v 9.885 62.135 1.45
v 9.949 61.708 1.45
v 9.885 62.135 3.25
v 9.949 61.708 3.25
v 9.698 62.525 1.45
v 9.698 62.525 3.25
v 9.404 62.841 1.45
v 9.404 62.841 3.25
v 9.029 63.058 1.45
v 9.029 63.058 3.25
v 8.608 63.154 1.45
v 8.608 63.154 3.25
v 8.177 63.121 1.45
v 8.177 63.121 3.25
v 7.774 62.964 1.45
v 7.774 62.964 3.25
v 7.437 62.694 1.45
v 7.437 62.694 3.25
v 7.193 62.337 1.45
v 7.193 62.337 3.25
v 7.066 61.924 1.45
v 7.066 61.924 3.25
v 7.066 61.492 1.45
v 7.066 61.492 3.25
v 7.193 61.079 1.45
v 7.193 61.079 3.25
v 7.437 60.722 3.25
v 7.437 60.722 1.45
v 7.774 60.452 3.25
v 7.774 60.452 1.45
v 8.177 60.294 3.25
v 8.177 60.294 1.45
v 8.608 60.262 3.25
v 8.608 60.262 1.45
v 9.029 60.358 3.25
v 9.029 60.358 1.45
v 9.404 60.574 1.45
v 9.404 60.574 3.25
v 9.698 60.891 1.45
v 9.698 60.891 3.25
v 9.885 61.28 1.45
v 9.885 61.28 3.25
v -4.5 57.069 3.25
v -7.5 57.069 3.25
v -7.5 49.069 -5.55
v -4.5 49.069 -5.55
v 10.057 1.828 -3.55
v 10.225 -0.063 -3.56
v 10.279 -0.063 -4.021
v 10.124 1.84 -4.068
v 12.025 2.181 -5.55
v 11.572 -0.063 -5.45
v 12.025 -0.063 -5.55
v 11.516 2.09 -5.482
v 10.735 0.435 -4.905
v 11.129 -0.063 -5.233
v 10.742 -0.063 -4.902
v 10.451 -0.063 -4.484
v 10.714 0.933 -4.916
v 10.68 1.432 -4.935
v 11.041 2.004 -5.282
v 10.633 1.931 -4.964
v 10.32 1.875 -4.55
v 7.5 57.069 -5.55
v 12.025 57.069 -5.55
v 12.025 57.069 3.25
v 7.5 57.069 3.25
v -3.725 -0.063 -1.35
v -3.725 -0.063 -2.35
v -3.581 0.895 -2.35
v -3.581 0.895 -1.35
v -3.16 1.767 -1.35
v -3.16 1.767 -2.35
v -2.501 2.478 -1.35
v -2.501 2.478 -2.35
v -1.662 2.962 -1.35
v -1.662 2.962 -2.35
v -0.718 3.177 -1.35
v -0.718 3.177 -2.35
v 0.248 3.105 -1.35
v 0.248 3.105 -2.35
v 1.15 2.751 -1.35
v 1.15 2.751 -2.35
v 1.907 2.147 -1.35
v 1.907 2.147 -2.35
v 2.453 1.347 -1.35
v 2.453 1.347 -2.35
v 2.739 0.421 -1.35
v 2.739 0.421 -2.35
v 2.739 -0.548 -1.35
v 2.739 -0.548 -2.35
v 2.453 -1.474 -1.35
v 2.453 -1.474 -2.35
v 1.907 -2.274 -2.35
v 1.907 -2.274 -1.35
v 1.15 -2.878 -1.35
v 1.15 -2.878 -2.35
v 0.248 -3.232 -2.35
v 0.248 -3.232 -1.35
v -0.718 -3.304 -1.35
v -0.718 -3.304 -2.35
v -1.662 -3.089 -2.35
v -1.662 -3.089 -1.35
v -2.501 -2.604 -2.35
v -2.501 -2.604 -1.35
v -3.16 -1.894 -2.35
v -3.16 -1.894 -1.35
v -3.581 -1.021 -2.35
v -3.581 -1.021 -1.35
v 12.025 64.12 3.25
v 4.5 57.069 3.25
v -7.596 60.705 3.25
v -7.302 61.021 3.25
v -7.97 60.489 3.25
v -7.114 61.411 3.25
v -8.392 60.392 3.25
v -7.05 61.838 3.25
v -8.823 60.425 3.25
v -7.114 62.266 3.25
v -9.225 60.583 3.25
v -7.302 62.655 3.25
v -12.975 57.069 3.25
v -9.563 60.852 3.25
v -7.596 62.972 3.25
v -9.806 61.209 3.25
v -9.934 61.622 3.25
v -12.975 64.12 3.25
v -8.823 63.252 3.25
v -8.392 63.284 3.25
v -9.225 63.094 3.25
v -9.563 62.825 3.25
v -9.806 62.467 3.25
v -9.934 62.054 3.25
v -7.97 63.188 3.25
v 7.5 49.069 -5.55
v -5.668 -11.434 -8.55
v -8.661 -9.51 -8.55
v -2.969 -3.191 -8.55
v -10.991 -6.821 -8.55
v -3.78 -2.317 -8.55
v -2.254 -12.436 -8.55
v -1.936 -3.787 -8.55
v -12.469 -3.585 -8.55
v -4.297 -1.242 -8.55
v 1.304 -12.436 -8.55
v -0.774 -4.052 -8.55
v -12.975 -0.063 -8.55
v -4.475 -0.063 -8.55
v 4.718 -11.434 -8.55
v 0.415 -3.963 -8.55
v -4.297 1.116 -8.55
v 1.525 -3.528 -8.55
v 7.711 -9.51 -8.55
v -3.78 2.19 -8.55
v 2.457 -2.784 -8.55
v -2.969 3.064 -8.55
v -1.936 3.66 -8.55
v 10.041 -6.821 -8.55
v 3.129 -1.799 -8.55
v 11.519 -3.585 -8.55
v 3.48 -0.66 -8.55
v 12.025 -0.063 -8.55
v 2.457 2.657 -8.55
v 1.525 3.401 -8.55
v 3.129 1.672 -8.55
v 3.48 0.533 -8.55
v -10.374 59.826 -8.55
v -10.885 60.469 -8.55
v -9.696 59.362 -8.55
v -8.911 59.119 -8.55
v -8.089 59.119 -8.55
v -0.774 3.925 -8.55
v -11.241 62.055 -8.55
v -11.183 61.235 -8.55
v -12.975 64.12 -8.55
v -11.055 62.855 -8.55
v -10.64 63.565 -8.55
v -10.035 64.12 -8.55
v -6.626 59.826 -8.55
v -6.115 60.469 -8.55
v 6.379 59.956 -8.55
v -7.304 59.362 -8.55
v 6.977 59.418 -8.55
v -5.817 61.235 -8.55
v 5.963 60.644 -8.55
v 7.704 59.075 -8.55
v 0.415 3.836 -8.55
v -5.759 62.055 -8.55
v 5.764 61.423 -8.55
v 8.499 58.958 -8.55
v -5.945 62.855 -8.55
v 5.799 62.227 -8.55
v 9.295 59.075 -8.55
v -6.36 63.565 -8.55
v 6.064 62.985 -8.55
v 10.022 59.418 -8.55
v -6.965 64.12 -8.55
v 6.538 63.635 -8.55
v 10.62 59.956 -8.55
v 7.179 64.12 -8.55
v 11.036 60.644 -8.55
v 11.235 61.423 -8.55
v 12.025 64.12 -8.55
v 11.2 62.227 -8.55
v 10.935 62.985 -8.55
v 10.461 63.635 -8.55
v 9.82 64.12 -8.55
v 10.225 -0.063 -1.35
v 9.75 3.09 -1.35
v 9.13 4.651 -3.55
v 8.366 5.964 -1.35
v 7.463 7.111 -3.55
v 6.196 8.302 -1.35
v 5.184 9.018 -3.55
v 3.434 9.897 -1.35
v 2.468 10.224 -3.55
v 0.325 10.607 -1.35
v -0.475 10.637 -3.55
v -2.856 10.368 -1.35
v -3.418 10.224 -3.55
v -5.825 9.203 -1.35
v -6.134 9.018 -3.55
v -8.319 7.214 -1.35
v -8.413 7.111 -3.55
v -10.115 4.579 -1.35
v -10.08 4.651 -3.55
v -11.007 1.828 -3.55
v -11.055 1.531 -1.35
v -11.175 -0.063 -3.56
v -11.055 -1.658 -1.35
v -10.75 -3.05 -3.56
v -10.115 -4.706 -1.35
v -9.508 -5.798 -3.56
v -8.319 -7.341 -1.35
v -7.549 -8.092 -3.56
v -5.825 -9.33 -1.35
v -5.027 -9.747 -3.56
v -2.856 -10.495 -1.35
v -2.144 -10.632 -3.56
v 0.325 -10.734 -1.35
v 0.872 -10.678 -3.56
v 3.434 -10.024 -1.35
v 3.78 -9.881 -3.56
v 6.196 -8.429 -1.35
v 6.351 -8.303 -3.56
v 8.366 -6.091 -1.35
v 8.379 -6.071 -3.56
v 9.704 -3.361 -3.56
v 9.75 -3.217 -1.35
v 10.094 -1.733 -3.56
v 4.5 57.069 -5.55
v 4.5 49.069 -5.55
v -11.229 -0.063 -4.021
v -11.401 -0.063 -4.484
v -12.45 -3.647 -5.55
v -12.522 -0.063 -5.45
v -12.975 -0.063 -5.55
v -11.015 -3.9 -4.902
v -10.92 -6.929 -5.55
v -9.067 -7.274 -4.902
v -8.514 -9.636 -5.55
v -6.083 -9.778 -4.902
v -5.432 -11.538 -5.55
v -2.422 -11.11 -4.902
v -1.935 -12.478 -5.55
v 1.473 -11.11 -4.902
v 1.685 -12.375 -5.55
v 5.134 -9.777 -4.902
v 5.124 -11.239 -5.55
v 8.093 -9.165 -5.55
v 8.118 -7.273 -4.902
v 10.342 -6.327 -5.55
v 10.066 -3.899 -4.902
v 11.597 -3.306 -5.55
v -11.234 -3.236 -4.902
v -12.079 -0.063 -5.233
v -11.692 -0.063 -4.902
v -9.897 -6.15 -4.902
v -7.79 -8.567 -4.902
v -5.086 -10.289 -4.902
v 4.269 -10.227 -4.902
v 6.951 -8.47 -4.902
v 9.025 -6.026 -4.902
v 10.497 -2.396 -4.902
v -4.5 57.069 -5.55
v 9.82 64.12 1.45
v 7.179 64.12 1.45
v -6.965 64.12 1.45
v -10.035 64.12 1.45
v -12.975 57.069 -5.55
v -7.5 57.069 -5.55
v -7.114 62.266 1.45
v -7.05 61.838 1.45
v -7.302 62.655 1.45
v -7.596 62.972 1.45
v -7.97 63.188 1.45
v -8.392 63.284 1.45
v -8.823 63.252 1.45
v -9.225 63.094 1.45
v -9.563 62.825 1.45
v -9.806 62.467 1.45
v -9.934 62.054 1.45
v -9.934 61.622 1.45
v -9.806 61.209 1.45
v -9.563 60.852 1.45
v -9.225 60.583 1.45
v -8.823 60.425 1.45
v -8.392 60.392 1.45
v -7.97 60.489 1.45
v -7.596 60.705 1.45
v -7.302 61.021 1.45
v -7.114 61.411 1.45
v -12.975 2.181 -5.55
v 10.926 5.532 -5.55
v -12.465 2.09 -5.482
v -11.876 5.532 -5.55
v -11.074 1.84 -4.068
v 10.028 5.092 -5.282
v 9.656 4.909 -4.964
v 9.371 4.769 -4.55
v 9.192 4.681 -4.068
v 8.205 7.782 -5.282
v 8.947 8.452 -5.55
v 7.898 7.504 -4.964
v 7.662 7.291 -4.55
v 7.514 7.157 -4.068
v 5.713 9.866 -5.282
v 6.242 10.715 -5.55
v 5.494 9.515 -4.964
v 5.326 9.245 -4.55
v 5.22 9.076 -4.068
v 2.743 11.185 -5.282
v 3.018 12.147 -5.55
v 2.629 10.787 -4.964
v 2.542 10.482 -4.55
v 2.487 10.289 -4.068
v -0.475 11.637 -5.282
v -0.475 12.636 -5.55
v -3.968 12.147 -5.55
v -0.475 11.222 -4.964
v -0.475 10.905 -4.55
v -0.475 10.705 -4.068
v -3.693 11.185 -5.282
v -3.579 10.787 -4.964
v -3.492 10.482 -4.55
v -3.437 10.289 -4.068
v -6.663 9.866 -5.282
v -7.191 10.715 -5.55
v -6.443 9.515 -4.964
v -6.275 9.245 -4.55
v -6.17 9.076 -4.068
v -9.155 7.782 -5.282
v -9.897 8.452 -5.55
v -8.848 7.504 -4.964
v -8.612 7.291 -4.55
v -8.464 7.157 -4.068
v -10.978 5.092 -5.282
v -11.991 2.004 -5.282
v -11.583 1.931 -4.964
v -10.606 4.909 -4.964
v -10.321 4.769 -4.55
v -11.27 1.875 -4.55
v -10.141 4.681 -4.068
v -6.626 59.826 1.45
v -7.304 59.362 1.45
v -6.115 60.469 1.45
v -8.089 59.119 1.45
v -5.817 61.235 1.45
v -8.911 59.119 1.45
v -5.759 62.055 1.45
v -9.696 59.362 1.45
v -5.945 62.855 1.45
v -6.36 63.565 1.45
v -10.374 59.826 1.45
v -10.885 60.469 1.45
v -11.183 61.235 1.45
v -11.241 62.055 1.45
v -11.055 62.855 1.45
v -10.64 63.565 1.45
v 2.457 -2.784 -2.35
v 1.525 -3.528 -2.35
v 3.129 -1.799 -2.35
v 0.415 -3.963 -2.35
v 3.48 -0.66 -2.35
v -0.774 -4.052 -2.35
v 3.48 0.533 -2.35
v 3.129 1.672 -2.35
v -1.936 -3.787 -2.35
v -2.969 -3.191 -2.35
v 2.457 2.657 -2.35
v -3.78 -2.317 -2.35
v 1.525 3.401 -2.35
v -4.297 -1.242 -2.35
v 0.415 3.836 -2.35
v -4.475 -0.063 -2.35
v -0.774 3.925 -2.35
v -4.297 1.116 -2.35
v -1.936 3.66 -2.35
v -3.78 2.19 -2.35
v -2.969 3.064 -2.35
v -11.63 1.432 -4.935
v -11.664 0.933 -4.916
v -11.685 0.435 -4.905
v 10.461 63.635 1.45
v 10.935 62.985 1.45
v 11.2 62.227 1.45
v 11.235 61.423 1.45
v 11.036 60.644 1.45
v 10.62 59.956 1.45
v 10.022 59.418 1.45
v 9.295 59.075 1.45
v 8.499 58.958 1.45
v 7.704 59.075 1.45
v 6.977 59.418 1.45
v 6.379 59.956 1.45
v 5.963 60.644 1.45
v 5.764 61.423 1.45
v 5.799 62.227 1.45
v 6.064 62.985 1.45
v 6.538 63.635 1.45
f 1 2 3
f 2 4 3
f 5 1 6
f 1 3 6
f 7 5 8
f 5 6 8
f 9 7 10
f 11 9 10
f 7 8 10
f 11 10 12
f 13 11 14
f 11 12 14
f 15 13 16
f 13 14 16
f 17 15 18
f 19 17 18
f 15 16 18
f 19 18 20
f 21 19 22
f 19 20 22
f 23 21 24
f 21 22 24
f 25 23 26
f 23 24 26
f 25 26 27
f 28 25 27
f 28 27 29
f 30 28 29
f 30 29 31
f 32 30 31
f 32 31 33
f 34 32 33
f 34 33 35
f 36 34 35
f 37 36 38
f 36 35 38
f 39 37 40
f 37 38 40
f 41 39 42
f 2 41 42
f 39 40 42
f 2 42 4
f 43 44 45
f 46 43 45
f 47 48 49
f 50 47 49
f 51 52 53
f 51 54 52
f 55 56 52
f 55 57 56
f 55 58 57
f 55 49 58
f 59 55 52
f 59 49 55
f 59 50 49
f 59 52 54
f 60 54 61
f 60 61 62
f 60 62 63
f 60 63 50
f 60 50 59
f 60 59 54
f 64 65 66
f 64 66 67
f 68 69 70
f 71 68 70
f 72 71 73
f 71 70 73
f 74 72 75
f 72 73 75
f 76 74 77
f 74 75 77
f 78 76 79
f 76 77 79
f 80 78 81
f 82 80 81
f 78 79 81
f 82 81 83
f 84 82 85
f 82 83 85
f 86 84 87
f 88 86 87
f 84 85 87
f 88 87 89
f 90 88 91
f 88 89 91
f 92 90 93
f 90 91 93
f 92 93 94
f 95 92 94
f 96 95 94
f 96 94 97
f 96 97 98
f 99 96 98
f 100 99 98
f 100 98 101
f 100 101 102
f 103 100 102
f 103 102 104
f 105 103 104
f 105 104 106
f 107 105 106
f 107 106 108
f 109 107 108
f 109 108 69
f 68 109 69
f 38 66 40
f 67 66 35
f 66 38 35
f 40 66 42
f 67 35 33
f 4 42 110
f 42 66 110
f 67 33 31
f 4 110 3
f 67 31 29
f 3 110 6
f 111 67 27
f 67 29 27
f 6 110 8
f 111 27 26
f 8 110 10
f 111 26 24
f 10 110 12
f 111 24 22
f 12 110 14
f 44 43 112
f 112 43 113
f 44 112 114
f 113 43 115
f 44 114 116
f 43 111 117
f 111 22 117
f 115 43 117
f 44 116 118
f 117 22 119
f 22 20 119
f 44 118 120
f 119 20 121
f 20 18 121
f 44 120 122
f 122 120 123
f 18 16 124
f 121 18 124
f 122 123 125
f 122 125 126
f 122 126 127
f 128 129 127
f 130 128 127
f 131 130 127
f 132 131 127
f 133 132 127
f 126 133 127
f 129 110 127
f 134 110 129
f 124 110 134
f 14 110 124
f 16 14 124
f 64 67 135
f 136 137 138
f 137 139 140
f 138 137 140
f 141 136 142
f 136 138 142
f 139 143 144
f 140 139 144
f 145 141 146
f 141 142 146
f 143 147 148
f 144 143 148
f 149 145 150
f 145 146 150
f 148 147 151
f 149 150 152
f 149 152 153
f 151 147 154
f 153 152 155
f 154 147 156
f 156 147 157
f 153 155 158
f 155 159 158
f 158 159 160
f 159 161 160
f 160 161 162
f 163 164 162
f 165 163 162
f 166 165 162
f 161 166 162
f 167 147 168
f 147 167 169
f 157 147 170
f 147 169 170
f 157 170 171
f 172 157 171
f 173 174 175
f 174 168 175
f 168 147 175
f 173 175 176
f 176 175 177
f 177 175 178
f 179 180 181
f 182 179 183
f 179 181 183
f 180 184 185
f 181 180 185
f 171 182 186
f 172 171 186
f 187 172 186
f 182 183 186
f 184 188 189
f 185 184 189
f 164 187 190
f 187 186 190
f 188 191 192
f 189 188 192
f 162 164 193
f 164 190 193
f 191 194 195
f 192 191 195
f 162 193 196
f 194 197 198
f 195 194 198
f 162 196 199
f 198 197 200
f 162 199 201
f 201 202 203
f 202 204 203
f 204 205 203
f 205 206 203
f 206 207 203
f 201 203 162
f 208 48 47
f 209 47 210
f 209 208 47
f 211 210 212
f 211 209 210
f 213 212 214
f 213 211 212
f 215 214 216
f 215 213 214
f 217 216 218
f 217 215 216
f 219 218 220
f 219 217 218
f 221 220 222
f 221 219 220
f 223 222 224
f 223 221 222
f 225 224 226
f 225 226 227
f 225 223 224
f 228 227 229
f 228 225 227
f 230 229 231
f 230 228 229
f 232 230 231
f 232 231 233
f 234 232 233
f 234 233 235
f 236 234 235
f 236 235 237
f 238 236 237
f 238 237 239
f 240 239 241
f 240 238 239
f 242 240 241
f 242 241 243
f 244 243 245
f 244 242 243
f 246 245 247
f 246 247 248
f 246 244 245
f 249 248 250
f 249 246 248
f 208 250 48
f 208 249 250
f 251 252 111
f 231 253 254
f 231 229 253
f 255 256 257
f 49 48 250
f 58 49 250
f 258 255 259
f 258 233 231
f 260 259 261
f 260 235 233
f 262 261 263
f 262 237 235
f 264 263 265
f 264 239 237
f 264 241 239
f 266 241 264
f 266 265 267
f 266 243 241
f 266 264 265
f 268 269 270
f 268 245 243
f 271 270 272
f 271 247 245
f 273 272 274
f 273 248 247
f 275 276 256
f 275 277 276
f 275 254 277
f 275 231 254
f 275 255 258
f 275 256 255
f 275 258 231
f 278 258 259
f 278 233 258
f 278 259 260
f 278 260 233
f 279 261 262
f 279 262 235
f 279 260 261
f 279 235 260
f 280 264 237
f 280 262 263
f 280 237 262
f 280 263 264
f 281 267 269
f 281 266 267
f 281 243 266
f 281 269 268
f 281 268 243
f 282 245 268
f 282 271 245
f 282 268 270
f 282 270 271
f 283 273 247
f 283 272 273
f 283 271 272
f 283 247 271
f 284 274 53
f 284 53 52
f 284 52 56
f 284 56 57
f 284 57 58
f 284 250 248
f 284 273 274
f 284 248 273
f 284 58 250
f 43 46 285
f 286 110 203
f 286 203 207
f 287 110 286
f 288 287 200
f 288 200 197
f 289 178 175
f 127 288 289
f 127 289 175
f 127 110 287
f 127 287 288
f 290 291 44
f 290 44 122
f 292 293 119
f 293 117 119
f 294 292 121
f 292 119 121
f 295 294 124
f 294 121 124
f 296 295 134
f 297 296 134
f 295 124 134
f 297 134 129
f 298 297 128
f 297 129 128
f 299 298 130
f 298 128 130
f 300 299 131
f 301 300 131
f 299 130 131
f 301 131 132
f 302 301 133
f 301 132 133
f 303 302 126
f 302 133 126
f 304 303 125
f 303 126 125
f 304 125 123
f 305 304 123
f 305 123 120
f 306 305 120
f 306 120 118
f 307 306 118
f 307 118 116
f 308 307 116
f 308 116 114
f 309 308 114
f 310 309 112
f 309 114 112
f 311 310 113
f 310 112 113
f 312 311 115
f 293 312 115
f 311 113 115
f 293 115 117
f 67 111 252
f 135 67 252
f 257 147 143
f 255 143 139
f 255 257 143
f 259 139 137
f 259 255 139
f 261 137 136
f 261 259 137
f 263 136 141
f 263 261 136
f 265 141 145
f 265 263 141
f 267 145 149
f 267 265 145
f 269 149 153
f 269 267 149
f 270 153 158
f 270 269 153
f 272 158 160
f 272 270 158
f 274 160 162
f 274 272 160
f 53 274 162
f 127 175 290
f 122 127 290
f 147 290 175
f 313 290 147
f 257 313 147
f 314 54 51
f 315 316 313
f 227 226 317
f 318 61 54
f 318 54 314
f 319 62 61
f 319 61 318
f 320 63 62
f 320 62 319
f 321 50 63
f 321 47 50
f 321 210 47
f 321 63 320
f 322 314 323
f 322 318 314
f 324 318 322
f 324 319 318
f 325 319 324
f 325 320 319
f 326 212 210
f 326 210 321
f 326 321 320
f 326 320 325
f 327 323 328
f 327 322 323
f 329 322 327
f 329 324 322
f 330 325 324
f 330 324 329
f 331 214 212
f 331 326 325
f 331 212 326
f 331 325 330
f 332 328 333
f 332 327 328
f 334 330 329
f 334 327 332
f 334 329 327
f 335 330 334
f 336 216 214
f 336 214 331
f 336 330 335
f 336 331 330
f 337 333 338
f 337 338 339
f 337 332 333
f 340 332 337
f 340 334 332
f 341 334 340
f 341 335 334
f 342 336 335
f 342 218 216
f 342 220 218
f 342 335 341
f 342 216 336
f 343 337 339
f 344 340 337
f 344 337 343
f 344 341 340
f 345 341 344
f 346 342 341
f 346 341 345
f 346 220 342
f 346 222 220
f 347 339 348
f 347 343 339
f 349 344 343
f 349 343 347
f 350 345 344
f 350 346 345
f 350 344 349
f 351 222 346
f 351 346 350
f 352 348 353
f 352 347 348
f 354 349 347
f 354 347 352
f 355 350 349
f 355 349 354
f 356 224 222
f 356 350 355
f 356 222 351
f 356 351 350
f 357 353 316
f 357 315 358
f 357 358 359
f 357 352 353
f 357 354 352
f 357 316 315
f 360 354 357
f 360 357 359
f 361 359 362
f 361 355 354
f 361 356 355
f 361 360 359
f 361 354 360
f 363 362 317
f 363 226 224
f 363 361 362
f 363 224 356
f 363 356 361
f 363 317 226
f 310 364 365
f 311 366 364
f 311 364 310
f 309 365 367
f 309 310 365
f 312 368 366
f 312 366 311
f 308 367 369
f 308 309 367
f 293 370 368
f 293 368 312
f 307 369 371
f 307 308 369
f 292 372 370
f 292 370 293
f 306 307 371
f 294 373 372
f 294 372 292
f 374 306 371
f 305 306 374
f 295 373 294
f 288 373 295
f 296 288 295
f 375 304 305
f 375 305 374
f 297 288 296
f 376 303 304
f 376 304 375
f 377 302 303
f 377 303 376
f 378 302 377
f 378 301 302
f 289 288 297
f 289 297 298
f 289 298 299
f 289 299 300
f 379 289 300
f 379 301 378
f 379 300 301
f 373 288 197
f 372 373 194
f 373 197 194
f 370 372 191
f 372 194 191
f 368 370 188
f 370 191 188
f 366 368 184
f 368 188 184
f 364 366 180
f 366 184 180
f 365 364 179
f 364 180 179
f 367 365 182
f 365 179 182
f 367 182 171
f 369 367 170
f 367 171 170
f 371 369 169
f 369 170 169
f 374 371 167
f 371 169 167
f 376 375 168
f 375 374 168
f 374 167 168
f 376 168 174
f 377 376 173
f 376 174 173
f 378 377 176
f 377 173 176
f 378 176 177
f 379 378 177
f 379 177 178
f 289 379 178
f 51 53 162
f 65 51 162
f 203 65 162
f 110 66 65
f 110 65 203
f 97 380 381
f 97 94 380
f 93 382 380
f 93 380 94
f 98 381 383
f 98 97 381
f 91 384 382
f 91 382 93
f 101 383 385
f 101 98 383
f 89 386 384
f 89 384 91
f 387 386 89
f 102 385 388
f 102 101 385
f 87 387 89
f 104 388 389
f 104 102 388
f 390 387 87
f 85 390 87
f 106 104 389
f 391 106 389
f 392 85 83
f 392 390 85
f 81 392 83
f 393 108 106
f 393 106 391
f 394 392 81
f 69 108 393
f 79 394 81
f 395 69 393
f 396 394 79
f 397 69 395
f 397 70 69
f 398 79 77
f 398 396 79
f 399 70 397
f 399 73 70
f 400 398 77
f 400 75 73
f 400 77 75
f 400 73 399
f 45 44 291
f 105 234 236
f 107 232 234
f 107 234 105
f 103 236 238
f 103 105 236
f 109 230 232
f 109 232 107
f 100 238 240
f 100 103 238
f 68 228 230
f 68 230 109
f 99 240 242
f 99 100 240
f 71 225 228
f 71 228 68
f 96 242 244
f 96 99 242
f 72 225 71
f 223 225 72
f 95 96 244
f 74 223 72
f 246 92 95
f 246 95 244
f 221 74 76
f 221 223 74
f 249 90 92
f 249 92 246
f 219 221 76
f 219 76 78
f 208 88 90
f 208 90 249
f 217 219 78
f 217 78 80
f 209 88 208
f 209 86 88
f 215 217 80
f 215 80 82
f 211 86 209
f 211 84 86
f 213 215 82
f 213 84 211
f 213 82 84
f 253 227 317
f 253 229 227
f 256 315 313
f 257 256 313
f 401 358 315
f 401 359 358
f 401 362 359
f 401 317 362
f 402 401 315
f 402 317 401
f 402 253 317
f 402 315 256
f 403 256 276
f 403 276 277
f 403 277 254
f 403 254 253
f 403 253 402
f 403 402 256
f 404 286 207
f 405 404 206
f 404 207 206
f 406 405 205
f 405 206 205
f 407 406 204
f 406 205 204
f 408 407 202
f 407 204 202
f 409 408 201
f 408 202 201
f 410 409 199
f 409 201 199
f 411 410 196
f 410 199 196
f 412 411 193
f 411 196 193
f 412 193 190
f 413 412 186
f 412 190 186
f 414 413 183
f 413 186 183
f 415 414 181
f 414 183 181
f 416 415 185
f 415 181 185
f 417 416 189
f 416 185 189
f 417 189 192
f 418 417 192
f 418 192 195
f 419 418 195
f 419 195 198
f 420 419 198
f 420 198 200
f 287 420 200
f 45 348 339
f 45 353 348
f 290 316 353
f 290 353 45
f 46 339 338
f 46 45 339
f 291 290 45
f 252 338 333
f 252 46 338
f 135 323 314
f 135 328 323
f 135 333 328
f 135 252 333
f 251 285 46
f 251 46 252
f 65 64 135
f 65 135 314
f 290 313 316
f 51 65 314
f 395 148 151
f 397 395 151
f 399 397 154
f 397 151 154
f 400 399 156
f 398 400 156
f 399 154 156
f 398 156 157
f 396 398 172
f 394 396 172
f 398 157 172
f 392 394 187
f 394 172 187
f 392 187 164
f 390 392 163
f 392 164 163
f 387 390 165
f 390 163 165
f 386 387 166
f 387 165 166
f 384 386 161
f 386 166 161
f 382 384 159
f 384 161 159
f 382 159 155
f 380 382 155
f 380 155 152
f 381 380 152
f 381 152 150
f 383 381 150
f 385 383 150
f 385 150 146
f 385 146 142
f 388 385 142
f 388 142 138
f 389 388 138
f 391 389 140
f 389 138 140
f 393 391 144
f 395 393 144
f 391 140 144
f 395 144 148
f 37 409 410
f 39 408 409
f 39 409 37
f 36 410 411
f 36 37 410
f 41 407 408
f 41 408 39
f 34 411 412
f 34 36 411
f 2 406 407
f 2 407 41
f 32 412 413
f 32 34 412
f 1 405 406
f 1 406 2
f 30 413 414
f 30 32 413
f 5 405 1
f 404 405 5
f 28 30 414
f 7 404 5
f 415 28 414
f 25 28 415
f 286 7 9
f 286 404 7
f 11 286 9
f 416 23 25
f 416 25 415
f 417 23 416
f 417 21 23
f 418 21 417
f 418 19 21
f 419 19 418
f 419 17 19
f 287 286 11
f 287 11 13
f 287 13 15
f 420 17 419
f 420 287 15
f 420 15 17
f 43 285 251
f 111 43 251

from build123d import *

# Parameters (mm, degrees)
ESBO_O2_R                           = 10.7
RESSALTO_EXTRUS_O1_DEPTH            = 4.2
RESSALTO_EXTRUS_O3_DEPTH            = 3
ESBO_O5_W                           = 25
ESBO_O5_H                           = 7.051040728
RESSALTO_EXTRUS_O4_DEPTH            = 11.8
REBAIXO_PARA_SHCS_M2_51_D           = 2.9
REBAIXO_PARA_SHCS_M2_51_CBORE_D     = 5.5
REBAIXO_PARA_SHCS_M2_51_CBORE_DEPTH = 10
NERVURA1_REACH                      = 67.976
ESBO_O10_WALL_W                     = 145.845066172
ESBO_O10_WALL_H                     = 15
CORTE_EXTRUS_O1_REACH               = 68.009
ESBO_O11_W                          = 9
ESBO_O11_H                          = 8
ESBO_O12_R                          = 3.25
CORTE_EXTRUS_O2_DEPTH               = 67.475439137
ESBO_O13_R                          = 4
CORTE_EXTRUS_O3_DEPTH               = 6.2
FILETE1_R                           = 2


with BuildPart() as part:
    # Esboço2 → Ressalto-extrusão1 (new body)
    with BuildSketch(Plane.XY.offset(-1.35)):
        with Locations((-0.474928023, -0.063425095)):
            Circle(ESBO_O2_R)
    extrude(amount=-RESSALTO_EXTRUS_O1_DEPTH)

    # Esboço4 → Ressalto-extrusão3 (add)
    with BuildSketch(Plane(origin=(0, 0, -5.55), x_dir=(-1, 0, 0), z_dir=(0, 0, -1))):
        with BuildLine():
            Line((-12.025071977, -0.063425095), (-12.025071977, 64.120162595))
            Line((-12.025071977, 64.120162595), (12.974928023, 64.120162595))
            Line((12.974928023, 64.120162595), (12.974928023, -0.063425095))
            ThreePointArc((12.974928023, -0.063425095), (0.474928023, -12.563425095), (-12.025071977, -0.063425095))
        make_face()
    extrude(amount=RESSALTO_EXTRUS_O3_DEPTH)

    # Esboço5 → Ressalto-extrusão4 (add)
    with BuildSketch(Plane(origin=(0, 0, -8.55), x_dir=(-1, 0, 0), z_dir=(0, 0, -1))):
        with Locations((0.474928023, 60.594642231)):
            Rectangle(ESBO_O5_W, ESBO_O5_H)
    extrude(amount=-RESSALTO_EXTRUS_O4_DEPTH)

    # Rebaixo para SHCS M2.51 (through all)
    with Locations(Plane(origin=(0, 0, -8.55), x_dir=(-1, 0, 0), z_dir=(0, 0, -1))):
        with Locations((-8.49949915, 61.707782077), (8.5, 61.838275999)):
            CounterBoreHole(REBAIXO_PARA_SHCS_M2_51_D / 2, REBAIXO_PARA_SHCS_M2_51_CBORE_D / 2, REBAIXO_PARA_SHCS_M2_51_CBORE_DEPTH)

    # Esboço10 wall → Nervura1 (add, up to next)
    with BuildSketch(Plane(origin=(0, 53.069121867, -1.15), x_dir=(0, -0.672672793996, -0.739940073396), z_dir=(0, 0.739940073396, -0.672672793996)), mode=Mode.PRIVATE) as nervura1_sk1:
        Rectangle(ESBO_O10_WALL_W, ESBO_O10_WALL_H)
    nervura1_tool1 = extrude(nervura1_sk1.sketch, amount=NERVURA1_REACH, mode=Mode.PRIVATE) - part.part
    add(nervura1_tool1.solids().sort_by_distance((0, 53.069121867, -1.15))[0])

    # Esboço11 → Corte-extrusão1 (cut, up to next)
    with BuildSketch(Plane.XY.offset(-5.55), mode=Mode.PRIVATE) as corte_extrus_o1_sk1:
        with Locations((0, 53.069121867)):
            Rectangle(ESBO_O11_W, ESBO_O11_H)
    corte_extrus_o1_tool1 = extrude(corte_extrus_o1_sk1.sketch, amount=CORTE_EXTRUS_O1_REACH, mode=Mode.PRIVATE) & part.part
    add(corte_extrus_o1_tool1.solids().sort_by_distance((0, 53.069122, -5.55))[0], mode=Mode.SUBTRACT)

    # Esboço12 → Corte-extrusão2 (cut, through all)
    with BuildSketch(Plane(origin=(0, 0, -8.55), x_dir=(-1, 0, 0), z_dir=(0, 0, -1))):
        with Locations((0.474928023, -0.063425095)):
            Circle(ESBO_O12_R)
    extrude(amount=-CORTE_EXTRUS_O2_DEPTH, mode=Mode.SUBTRACT)

    # Esboço13 → Corte-extrusão3 (cut)
    with BuildSketch(Plane(origin=(0, 0, -8.55), x_dir=(-1, 0, 0), z_dir=(0, 0, -1))):
        with Locations((0.474928023, -0.063425095)):
            Circle(ESBO_O13_R)
    extrude(amount=-CORTE_EXTRUS_O3_DEPTH, mode=Mode.SUBTRACT)

    # Filete1
    filete1_edges = [part.edges().sort_by_distance(p)[0] for p in [
        (-11.174928023, -0.063425095, -5.55),
    ]]
    fillet(filete1_edges, radius=FILETE1_R - 0.0001)  # a hair under: the kernel refuses the full size


solid = part.part
